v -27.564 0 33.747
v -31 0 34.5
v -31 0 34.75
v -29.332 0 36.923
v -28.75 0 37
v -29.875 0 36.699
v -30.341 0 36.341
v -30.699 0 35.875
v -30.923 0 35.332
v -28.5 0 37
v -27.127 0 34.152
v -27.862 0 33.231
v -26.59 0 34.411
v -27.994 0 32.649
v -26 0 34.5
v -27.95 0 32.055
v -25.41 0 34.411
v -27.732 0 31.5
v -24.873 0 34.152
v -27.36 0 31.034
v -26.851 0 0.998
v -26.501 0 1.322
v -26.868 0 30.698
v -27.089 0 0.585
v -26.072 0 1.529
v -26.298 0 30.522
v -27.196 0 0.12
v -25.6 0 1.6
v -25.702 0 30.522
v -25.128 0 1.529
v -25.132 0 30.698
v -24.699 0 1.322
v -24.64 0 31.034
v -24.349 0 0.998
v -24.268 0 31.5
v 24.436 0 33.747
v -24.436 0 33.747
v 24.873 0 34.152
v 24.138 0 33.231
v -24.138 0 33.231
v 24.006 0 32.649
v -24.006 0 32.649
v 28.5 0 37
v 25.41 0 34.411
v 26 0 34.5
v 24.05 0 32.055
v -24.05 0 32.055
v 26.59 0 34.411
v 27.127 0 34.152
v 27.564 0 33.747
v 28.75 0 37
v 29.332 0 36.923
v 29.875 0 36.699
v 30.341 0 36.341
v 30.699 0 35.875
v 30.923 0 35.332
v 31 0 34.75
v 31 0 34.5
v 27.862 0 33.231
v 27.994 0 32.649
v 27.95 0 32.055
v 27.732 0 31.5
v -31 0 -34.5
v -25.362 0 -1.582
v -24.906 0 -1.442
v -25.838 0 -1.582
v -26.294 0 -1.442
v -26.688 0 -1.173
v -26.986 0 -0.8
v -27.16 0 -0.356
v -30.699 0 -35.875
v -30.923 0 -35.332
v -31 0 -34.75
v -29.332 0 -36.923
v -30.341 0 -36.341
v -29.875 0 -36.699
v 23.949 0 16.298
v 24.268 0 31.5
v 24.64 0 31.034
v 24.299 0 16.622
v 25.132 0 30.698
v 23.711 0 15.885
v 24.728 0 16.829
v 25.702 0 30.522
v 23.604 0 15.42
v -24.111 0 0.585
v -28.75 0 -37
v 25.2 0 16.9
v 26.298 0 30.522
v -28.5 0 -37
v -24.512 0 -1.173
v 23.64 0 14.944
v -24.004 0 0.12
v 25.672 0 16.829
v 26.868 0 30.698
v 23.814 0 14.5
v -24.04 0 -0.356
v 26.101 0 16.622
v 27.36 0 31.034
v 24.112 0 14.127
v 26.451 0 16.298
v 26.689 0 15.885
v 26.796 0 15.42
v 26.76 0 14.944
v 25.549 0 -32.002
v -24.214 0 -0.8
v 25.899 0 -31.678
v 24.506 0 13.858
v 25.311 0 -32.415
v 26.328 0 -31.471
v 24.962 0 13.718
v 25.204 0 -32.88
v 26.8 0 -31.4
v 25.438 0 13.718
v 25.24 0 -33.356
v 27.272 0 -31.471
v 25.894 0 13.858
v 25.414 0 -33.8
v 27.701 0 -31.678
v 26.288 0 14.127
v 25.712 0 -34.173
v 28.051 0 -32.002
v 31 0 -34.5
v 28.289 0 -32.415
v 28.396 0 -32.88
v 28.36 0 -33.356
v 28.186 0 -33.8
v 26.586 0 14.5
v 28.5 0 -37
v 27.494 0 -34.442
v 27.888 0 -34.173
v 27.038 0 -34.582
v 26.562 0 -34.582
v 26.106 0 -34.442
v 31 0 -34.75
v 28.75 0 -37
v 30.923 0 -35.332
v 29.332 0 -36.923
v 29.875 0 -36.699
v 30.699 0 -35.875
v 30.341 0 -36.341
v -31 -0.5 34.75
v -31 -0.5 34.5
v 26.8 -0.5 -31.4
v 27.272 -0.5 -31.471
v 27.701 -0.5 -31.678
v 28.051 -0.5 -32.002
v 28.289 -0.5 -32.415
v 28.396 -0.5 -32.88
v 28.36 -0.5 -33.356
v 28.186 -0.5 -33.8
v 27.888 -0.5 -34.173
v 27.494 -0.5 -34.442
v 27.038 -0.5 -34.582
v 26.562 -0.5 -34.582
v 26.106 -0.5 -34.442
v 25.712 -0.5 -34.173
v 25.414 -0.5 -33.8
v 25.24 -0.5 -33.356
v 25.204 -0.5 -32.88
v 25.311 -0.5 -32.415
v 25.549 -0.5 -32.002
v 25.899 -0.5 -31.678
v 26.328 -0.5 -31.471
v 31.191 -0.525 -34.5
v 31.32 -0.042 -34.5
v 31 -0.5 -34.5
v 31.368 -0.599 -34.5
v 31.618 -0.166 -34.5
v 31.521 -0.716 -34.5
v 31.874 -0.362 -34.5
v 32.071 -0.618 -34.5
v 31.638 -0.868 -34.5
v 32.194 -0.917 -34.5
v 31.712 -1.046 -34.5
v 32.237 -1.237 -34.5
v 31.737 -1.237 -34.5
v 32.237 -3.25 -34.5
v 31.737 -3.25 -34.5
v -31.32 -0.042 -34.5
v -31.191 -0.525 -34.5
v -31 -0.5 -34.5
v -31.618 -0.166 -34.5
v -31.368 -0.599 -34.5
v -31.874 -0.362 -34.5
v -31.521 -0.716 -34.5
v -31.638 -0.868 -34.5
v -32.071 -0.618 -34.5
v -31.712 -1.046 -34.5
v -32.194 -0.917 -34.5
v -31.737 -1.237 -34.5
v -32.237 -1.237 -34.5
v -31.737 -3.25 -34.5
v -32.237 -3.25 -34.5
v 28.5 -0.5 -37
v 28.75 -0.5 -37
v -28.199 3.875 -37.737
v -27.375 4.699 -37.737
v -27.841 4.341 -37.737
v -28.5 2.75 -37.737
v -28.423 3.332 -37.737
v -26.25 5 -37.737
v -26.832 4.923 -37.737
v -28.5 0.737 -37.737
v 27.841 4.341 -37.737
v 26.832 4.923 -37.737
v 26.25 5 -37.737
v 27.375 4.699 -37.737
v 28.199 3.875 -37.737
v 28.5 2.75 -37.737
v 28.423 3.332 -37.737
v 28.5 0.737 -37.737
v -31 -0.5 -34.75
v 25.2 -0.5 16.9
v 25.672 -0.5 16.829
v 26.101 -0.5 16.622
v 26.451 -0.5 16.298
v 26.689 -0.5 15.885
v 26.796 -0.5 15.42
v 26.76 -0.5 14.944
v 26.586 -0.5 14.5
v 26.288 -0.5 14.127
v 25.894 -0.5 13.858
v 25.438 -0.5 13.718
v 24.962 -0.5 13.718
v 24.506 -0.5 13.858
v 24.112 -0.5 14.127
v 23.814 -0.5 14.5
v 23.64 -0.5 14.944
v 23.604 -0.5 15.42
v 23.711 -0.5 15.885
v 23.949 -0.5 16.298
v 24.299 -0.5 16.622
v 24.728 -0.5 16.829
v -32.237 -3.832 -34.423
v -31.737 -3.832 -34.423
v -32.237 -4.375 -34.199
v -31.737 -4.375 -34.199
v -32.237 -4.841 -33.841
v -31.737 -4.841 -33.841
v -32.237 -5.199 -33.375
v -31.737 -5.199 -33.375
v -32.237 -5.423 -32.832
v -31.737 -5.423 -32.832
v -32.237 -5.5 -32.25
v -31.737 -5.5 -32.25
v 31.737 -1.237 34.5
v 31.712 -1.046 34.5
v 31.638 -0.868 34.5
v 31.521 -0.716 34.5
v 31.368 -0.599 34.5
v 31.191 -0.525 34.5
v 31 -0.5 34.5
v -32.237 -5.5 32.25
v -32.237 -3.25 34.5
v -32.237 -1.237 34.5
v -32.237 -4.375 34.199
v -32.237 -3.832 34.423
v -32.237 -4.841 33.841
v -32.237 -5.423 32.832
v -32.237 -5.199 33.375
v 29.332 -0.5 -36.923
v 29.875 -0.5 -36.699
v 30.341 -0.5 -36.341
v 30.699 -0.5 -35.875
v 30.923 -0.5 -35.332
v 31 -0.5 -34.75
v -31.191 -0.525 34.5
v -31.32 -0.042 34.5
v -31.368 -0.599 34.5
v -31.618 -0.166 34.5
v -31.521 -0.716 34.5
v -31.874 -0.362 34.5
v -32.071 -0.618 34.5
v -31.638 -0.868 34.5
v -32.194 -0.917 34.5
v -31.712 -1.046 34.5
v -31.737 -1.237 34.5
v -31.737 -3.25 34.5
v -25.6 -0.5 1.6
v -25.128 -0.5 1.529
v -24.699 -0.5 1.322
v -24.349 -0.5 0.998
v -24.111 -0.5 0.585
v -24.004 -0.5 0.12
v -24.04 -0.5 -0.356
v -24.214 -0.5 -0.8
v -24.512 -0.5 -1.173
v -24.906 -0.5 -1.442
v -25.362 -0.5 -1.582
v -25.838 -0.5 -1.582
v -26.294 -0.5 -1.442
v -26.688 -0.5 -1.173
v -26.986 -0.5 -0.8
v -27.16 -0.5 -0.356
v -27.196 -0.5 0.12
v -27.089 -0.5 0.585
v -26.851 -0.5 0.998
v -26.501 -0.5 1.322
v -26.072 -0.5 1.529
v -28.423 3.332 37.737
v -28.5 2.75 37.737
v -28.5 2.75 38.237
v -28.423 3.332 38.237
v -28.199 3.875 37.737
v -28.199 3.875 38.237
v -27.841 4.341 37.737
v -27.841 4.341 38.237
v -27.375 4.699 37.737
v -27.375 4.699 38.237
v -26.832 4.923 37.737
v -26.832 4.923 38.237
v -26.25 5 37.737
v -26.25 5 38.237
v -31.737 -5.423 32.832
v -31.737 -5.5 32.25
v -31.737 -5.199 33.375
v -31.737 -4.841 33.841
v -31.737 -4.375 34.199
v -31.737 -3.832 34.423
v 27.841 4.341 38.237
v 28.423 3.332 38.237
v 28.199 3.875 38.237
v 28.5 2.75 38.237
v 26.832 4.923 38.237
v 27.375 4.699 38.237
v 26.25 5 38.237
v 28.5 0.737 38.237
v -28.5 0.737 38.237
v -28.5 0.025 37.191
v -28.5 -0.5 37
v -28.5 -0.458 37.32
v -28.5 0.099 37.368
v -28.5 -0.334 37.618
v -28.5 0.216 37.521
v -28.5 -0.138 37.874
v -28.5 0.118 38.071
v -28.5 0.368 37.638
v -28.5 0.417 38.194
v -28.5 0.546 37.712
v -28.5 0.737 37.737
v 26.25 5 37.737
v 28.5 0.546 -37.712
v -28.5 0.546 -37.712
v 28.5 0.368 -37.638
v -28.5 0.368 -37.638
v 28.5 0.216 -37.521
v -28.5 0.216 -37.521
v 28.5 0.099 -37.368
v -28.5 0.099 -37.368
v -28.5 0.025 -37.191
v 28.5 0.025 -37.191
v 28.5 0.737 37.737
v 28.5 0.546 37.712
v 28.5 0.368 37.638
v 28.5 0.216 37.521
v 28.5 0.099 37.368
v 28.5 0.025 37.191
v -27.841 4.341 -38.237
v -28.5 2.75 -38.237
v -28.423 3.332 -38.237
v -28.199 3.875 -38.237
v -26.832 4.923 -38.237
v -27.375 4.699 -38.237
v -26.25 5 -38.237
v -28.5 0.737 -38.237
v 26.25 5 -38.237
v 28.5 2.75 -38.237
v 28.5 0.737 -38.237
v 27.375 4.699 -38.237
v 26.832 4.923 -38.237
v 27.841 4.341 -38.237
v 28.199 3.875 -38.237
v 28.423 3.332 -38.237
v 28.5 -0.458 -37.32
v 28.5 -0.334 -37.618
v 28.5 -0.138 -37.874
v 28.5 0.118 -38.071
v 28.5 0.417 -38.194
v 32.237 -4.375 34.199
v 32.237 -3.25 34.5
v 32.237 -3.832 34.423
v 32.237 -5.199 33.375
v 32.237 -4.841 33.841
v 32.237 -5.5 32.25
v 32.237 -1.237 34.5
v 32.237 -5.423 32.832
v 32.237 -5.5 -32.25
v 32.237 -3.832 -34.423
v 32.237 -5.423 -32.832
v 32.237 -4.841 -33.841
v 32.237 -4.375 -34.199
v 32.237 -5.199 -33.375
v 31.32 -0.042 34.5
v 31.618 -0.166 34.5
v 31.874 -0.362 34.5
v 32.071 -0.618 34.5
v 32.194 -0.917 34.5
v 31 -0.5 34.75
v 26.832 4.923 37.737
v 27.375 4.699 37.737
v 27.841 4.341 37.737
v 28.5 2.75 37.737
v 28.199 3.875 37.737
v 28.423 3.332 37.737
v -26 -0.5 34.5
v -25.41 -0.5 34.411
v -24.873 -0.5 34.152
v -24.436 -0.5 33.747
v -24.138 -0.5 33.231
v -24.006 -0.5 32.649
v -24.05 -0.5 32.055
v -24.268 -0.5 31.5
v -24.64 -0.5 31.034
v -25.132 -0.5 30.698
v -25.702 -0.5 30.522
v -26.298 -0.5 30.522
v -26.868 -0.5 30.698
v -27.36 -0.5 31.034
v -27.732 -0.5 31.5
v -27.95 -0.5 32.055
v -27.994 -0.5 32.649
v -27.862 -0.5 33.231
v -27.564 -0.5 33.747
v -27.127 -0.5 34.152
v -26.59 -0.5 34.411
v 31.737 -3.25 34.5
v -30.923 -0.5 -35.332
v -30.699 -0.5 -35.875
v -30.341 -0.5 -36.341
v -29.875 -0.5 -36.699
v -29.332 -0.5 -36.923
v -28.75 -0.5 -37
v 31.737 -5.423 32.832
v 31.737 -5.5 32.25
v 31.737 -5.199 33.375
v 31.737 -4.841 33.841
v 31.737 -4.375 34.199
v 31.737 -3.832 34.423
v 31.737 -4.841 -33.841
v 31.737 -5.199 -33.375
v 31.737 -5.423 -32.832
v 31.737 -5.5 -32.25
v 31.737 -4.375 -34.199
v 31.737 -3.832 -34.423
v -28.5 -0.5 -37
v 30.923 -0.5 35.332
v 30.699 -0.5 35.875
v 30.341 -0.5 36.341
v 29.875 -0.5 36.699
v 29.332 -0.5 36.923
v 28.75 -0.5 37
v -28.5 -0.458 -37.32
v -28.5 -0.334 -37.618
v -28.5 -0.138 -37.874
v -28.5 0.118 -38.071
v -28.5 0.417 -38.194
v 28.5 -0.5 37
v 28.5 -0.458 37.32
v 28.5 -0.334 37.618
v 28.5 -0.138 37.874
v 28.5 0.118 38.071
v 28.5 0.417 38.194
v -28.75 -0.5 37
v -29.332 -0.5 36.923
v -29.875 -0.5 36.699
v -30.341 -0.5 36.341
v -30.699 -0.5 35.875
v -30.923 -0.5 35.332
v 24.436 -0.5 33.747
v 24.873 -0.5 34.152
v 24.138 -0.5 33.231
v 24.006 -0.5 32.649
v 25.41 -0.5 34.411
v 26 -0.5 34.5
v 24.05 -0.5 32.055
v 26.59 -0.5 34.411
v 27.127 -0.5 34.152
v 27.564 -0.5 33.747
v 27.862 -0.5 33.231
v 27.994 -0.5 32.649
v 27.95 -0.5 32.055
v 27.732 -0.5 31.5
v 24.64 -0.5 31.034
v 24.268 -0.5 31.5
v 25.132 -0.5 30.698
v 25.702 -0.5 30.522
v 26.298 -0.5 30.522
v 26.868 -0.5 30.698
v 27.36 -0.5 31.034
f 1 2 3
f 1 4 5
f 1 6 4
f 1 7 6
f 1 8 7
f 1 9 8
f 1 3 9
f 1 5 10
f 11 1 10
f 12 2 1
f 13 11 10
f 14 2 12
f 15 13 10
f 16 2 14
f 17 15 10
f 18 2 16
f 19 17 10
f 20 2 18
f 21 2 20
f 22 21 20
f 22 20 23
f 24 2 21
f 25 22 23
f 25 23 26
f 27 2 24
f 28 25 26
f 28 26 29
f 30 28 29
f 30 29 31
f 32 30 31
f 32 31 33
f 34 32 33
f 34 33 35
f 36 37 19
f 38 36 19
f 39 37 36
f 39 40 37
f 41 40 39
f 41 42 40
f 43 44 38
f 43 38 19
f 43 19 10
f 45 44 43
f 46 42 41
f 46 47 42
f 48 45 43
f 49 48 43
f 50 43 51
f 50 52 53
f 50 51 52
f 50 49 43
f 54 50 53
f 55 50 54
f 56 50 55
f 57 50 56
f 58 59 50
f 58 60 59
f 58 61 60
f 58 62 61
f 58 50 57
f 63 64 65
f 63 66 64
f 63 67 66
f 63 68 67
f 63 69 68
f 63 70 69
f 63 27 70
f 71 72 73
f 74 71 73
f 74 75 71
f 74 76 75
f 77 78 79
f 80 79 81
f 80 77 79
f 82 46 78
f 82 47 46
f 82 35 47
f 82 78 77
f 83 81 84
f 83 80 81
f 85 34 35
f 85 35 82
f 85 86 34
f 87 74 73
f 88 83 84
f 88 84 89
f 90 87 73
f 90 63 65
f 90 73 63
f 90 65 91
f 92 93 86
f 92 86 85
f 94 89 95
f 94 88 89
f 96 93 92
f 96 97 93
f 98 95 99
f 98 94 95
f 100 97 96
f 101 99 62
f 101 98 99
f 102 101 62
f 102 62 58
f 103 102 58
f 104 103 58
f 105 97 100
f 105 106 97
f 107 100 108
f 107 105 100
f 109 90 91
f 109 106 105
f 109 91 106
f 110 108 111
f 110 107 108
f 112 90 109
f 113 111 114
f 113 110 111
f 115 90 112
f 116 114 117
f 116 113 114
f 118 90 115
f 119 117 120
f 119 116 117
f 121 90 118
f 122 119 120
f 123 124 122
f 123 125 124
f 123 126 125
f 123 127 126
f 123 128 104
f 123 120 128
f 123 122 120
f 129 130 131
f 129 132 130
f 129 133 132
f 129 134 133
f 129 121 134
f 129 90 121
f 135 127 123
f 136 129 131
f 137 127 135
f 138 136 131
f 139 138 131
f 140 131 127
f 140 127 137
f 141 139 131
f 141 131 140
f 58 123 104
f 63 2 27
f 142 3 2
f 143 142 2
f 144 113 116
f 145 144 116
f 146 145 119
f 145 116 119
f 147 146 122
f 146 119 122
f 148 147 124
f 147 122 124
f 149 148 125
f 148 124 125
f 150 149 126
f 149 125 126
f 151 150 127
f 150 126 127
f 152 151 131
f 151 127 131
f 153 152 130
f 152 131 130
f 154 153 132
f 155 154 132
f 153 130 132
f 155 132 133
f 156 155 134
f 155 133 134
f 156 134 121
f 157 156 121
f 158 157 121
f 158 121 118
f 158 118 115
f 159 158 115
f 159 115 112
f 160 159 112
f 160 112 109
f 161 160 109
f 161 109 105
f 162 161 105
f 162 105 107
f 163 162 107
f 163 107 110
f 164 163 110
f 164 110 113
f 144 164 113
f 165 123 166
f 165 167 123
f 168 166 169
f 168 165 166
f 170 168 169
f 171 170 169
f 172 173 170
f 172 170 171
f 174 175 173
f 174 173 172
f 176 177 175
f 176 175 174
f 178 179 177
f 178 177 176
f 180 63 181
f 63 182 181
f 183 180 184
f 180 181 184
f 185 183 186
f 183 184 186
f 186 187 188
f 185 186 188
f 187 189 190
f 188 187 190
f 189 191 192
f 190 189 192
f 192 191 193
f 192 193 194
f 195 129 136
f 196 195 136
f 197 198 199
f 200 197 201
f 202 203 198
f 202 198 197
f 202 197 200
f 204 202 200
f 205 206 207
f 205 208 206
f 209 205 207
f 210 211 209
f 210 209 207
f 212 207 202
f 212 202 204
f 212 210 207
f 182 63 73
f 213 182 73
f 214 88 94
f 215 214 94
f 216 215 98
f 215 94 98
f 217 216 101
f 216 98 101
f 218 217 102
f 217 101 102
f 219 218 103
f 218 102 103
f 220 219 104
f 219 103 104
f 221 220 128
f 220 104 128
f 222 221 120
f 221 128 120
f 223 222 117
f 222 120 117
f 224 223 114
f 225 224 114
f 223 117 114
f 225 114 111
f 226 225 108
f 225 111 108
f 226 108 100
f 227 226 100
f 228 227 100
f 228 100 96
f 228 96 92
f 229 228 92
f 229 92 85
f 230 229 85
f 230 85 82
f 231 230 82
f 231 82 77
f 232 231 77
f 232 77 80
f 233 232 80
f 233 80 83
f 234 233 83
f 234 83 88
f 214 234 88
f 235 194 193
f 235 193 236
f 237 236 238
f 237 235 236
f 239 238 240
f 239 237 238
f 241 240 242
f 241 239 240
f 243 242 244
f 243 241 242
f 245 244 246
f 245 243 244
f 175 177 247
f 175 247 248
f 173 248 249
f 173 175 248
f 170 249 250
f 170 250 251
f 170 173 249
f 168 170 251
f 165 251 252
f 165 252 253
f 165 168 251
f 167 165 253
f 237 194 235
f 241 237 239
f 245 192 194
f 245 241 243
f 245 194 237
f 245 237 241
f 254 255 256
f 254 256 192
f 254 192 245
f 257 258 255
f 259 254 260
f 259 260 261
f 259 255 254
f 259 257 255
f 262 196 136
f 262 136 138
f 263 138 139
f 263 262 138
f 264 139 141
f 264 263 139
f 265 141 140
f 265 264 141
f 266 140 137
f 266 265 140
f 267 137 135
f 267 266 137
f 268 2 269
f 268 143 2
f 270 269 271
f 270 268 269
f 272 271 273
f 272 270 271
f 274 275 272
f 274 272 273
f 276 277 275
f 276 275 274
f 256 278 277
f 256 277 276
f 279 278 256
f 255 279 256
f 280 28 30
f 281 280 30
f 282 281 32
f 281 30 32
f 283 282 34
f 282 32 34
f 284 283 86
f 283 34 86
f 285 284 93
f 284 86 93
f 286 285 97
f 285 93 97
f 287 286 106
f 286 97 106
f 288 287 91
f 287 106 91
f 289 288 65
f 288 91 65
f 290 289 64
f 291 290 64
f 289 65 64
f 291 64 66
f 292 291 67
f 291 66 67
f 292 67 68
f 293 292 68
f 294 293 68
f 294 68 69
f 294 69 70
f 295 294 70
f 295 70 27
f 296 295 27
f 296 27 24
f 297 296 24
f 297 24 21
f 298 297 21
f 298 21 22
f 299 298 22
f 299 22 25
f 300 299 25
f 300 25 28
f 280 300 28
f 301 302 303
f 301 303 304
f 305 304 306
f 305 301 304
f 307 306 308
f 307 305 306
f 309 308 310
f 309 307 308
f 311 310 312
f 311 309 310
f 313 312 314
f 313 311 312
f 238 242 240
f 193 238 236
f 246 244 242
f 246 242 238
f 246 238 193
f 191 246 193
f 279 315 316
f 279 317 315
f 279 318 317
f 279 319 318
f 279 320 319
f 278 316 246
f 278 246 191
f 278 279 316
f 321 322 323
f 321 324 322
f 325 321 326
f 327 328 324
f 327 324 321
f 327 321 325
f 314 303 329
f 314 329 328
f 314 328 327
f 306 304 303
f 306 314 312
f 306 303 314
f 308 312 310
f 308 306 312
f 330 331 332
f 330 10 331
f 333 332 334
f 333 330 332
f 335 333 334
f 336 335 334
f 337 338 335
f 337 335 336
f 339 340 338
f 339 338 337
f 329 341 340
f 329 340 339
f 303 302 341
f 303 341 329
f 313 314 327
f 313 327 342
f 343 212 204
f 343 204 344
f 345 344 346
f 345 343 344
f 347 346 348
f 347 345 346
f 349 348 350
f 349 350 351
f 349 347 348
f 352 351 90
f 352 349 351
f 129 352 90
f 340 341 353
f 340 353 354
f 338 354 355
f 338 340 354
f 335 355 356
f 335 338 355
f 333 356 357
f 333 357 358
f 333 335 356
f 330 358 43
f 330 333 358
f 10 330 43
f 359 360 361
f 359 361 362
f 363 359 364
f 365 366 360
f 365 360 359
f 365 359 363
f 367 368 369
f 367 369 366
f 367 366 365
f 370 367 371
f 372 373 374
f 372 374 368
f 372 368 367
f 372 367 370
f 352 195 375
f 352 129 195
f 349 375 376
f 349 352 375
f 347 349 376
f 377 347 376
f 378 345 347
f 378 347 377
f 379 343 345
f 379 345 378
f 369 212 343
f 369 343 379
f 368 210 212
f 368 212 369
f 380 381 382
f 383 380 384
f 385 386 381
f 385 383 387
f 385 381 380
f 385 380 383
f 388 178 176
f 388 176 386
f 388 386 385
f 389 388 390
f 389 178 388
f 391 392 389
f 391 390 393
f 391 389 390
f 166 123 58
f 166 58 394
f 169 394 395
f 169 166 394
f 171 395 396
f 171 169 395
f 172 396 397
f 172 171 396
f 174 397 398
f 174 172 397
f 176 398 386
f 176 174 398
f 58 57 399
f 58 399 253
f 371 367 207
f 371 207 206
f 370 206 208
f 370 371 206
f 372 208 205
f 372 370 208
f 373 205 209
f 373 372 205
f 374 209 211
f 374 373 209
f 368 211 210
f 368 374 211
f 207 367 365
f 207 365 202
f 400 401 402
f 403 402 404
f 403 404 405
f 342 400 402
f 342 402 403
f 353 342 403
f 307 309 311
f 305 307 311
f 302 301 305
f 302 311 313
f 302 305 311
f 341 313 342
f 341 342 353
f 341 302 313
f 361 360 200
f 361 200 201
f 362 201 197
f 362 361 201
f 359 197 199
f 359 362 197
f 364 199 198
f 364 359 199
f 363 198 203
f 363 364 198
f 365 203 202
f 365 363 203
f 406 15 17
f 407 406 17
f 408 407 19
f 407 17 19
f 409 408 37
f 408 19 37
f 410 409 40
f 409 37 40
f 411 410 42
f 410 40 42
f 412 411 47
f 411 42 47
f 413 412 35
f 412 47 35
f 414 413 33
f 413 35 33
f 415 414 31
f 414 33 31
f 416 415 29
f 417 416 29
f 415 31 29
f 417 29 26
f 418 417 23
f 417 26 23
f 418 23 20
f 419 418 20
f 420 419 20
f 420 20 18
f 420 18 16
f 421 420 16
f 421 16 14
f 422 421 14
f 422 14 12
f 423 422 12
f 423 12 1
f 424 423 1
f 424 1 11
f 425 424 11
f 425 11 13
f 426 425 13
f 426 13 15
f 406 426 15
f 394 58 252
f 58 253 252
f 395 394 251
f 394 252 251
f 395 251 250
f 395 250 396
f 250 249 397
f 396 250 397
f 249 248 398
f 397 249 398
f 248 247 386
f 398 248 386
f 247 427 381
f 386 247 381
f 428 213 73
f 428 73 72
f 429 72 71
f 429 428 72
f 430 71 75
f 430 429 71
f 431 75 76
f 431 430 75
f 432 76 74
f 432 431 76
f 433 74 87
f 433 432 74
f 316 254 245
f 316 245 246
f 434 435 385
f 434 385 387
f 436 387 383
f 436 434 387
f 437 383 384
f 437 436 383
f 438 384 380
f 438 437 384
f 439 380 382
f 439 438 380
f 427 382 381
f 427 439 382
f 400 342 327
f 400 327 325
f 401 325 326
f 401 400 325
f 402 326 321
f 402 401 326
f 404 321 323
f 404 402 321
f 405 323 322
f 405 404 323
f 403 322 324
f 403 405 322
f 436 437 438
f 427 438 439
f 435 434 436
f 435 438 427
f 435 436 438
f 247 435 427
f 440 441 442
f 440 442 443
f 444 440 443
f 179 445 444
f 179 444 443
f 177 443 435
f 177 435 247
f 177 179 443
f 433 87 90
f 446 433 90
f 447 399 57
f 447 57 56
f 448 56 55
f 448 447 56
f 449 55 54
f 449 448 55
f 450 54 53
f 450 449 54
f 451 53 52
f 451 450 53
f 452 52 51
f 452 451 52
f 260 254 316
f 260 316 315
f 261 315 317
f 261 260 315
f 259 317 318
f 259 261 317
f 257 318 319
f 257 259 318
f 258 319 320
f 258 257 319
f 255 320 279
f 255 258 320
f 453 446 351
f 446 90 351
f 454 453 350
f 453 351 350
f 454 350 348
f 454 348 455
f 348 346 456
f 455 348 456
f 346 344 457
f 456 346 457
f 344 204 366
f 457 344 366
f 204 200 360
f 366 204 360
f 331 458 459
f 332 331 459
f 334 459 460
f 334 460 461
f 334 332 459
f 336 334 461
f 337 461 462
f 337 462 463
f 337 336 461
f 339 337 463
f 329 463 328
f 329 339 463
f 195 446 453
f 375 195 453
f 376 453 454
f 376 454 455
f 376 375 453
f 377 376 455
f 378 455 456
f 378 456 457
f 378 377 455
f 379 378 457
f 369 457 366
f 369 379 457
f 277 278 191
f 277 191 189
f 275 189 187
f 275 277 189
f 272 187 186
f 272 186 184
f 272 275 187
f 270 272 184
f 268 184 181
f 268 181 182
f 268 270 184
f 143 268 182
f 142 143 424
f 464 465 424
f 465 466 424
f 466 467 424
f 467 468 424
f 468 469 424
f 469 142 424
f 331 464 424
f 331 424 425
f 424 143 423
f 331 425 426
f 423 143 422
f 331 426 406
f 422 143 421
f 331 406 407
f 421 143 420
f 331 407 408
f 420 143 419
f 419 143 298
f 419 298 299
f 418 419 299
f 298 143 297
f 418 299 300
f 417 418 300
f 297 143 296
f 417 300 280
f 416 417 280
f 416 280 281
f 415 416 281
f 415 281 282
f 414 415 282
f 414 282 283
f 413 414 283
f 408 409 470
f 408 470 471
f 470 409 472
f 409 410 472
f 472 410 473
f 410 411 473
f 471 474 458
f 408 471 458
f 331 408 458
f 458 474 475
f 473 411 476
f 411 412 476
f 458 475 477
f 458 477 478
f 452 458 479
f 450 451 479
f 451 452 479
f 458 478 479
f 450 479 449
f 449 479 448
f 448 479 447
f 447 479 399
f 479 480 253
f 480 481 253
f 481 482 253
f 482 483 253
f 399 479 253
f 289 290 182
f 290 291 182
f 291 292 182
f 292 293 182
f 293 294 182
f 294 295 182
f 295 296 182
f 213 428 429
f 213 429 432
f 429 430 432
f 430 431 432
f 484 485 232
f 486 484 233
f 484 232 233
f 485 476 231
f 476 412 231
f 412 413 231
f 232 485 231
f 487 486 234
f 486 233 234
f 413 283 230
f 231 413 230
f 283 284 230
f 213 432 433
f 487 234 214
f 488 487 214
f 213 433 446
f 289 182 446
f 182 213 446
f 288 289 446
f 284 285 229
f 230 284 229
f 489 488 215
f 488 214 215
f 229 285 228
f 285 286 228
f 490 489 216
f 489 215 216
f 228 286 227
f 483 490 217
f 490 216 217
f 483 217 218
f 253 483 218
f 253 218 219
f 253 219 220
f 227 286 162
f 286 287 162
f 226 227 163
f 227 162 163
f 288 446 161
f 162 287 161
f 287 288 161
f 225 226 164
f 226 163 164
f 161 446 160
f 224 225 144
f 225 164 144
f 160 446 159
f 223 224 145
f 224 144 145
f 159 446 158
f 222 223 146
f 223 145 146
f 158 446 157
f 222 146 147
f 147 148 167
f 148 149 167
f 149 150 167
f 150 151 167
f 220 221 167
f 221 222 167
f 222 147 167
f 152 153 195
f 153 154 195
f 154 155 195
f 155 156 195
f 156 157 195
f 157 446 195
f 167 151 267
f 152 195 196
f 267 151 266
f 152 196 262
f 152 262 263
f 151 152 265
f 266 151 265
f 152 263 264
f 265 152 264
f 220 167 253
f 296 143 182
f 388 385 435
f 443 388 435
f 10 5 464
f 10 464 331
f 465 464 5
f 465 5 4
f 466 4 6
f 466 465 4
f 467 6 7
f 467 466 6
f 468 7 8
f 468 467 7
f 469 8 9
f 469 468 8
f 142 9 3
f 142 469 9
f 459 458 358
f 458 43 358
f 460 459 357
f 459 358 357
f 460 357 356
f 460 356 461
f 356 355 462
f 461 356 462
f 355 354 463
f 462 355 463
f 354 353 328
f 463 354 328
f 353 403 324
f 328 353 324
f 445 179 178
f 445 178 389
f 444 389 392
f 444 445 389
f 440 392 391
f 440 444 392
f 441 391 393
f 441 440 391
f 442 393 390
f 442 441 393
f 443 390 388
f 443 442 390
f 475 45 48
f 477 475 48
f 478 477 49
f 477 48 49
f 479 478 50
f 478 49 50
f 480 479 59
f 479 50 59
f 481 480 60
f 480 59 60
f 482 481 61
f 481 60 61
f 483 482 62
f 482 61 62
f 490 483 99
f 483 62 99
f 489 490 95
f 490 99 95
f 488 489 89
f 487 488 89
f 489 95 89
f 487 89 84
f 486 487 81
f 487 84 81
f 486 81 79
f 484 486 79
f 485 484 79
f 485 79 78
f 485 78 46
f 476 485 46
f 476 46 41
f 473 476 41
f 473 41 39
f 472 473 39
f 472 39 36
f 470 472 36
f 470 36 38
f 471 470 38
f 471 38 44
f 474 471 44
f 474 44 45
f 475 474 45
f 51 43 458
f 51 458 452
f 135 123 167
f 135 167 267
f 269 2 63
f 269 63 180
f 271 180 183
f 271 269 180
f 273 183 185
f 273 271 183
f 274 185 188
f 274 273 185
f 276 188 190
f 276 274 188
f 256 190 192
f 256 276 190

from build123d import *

# Parameters (mm, degrees)
SKETCH2_W               = 62
SKETCH2_H               = 74
BASE_FLANGE1_DEPTH      = 0.5
CUT_EXTRUDE1_REACH      = 50.273
SKETCH5_R               = 2
SKETCH5_R_2             = 1.6
EDGE_FLANGE1_DEPTH      = 57
EDGE_FLANGE1_BEND_DEPTH = 57
EDGE_FLANGE2_DEPTH      = 69
EDGE_FLANGE2_BEND_DEPTH = 69
BREAK_CORNER1_START     = -32.2366
BREAK_CORNER1_DEPTH     = 64.4732
BREAK_CORNER1_START_2   = -38.2366
BREAK_CORNER1_2_DEPTH   = 76.4732
BREAK_CORNER1_START_3   = -0.5
BREAK_CORNER1_3_DEPTH   = 0.5


# Read off the part's stored shape, not the designer's step: Break-Corner1
# Sheet-metal steps are written as plain solids
with BuildPart() as part:
    # Sketch2 → Base-Flange1 (new body)
    with BuildSketch(Plane(origin=(0, 0, 0), x_dir=(1, 0, 0), z_dir=(0, 1, 0))):
        Rectangle(SKETCH2_W, SKETCH2_H)
    extrude(amount=-BASE_FLANGE1_DEPTH)

    # Sketch5 → Cut-Extrude1 (cut, up to next)
    with BuildSketch(Plane(origin=(0, 0, 0), x_dir=(1, 0, 0), z_dir=(0, 1, 0)), mode=Mode.PRIVATE) as cut_extrude1_sk1:
        with Locations(Location((-26, -32.5, 0), (0, 0, 270))):
            Circle(SKETCH5_R)
    cut_extrude1_tool1 = extrude(cut_extrude1_sk1.sketch, amount=-CUT_EXTRUDE1_REACH, mode=Mode.PRIVATE) & part.part
    # Sketch5 → Cut-Extrude1 (cut, up to next)
    with BuildSketch(Plane(origin=(0, 0, 0), x_dir=(1, 0, 0), z_dir=(0, 1, 0)), mode=Mode.PRIVATE) as cut_extrude1_sk2:
        with Locations(Location((25.2, -15.3, 0), (0, 0, 270))):
            Circle(SKETCH5_R_2)
    cut_extrude1_tool2 = extrude(cut_extrude1_sk2.sketch, amount=-CUT_EXTRUDE1_REACH, mode=Mode.PRIVATE) & part.part
    # Sketch5 → Cut-Extrude1 (cut, up to next)
    with BuildSketch(Plane(origin=(0, 0, 0), x_dir=(1, 0, 0), z_dir=(0, 1, 0)), mode=Mode.PRIVATE) as cut_extrude1_sk3:
        with Locations(Location((-25.6, 0, 0), (0, 0, 270))):
            Circle(SKETCH5_R_2)
    cut_extrude1_tool3 = extrude(cut_extrude1_sk3.sketch, amount=-CUT_EXTRUDE1_REACH, mode=Mode.PRIVATE) & part.part
    # Sketch5 → Cut-Extrude1 (cut, up to next)
    with BuildSketch(Plane(origin=(0, 0, 0), x_dir=(1, 0, 0), z_dir=(0, 1, 0)), mode=Mode.PRIVATE) as cut_extrude1_sk4:
        with Locations(Location((26.8, 33, 0), (0, 0, 270))):
            Circle(SKETCH5_R_2)
    cut_extrude1_tool4 = extrude(cut_extrude1_sk4.sketch, amount=-CUT_EXTRUDE1_REACH, mode=Mode.PRIVATE) & part.part
    # Sketch5 → Cut-Extrude1 (cut, up to next)
    with BuildSketch(Plane(origin=(0, 0, 0), x_dir=(1, 0, 0), z_dir=(0, 1, 0)), mode=Mode.PRIVATE) as cut_extrude1_sk5:
        with Locations(Location((26, -32.5, 0), (0, 0, 270))):
            Circle(SKETCH5_R)
    cut_extrude1_tool5 = extrude(cut_extrude1_sk5.sketch, amount=-CUT_EXTRUDE1_REACH, mode=Mode.PRIVATE) & part.part
    add(cut_extrude1_tool1.solids().sort_by_distance((-26, 0, 32.5))[0], mode=Mode.SUBTRACT)
    add(cut_extrude1_tool2.solids().sort_by_distance((25.2, 0, 15.3))[0], mode=Mode.SUBTRACT)
    add(cut_extrude1_tool3.solids().sort_by_distance((-25.6, 0, 0))[0], mode=Mode.SUBTRACT)
    add(cut_extrude1_tool4.solids().sort_by_distance((26.8, 0, -33))[0], mode=Mode.SUBTRACT)
    add(cut_extrude1_tool5.solids().sort_by_distance((26, 0, 32.5))[0], mode=Mode.SUBTRACT)

    # Edge-Flange1 section (across the edge) → Edge-Flange1 (add)
    with BuildSketch(Plane(origin=(28.5, 0, -37.7366), x_dir=(0, 0, 1), z_dir=(-1, 0, 0))):
        with BuildLine():
            Line((-0.5, 0.7366), (-0.5, 5))
            Line((-0.5, 5), (0, 5))
            Line((0, 5), (0, 0.7366))
            ThreePointArc((0, 0.7366), (0.215745145, 0.215745145), (0.7366, 0))
            Line((0.7366, 0), (0.7366, -0.5))
            ThreePointArc((0.7366, -0.5), (-0.137808246, -0.137808246), (-0.5, 0.7366))
        make_face()
    extrude(amount=EDGE_FLANGE1_DEPTH)

    # Edge-Flange1 section 2 (across the edge) → Edge-Flange1 bend (add)
    with BuildSketch(Plane(origin=(-28.5, 0, 37.7366), x_dir=(0, 0, -1), z_dir=(1, 0, 0))):
        with BuildLine():
            Line((-0.5, 0.7366), (-0.5, 5))
            Line((-0.5, 5), (0, 5))
            Line((0, 5), (0, 0.7366))
            ThreePointArc((0, 0.7366), (0.215745145, 0.215745145), (0.7366, 0))
            Line((0.7366, 0), (0.7366, -0.5))
            ThreePointArc((0.7366, -0.5), (-0.137808246, -0.137808246), (-0.5, 0.7366))
        make_face()
    extrude(amount=EDGE_FLANGE1_BEND_DEPTH)

    # Edge-Flange2 section (across the edge) → Edge-Flange2 (add)
    with BuildSketch(Plane(origin=(31.7366, -0.5, -34.5), x_dir=(-1, 0, 0), z_dir=(0, 0, 1))):
        with BuildLine():
            Line((-0.5, 0.7366), (-0.5, 5))
            Line((-0.5, 5), (0, 5))
            Line((0, 5), (0, 0.7366))
            ThreePointArc((0, 0.7366), (0.215745145, 0.215745145), (0.7366, 0))
            Line((0.7366, 0), (0.7366, -0.5))
            ThreePointArc((0.7366, -0.5), (-0.137808246, -0.137808246), (-0.5, 0.7366))
        make_face()
    extrude(amount=EDGE_FLANGE2_DEPTH)

    # Edge-Flange2 section 2 (across the edge) → Edge-Flange2 bend (add)
    with BuildSketch(Plane(origin=(-31.7366, -0.5, 34.5), x_dir=(1, 0, 0), z_dir=(0, 0, -1))):
        with BuildLine():
            Line((-0.5, 0.7366), (-0.5, 5))
            Line((-0.5, 5), (0, 5))
            Line((0, 5), (0, 0.7366))
            ThreePointArc((0, 0.7366), (0.215745145, 0.215745145), (0.7366, 0))
            Line((0.7366, 0), (0.7366, -0.5))
            ThreePointArc((0.7366, -0.5), (-0.137808246, -0.137808246), (-0.5, 0.7366))
        make_face()
    extrude(amount=EDGE_FLANGE2_BEND_DEPTH)

    # Break-Corner1 outline → Break-Corner1 (cut)
    with BuildSketch(Plane.YZ.offset(BREAK_CORNER1_START)):
        with BuildLine():
            Line((-5.5, 34.5), (-5.5, 32.25))
            ThreePointArc((-5.5, 32.25), (-4.840990258, 33.840990258), (-3.25, 34.5))
            Line((-3.25, 34.5), (-5.5, 34.5))
        make_face()
        with BuildLine():
            ThreePointArc((-3.25, -34.5), (-4.840990258, -33.840990258), (-5.5, -32.25))
            Line((-5.5, -32.25), (-5.5, -34.5))
            Line((-5.5, -34.5), (-3.25, -34.5))
        make_face()
    extrude(amount=BREAK_CORNER1_DEPTH, mode=Mode.SUBTRACT)

    # Break-Corner1 2 outline → Break-Corner1 2 (cut)
    with BuildSketch(Plane.XY.offset(BREAK_CORNER1_START_2)):
        with BuildLine():
            ThreePointArc((-28.5, 2.75), (-27.840990258, 4.340990258), (-26.25, 5))
            Line((-26.25, 5), (-28.5, 5))
            Line((-28.5, 5), (-28.5, 2.75))
        make_face()
        with BuildLine():
            ThreePointArc((26.25, 5), (27.840990258, 4.340990258), (28.5, 2.75))
            Line((28.5, 2.75), (28.5, 5))
            Line((28.5, 5), (26.25, 5))
        make_face()
    extrude(amount=BREAK_CORNER1_2_DEPTH, mode=Mode.SUBTRACT)

    # Break-Corner1 3 outline → Break-Corner1 3 (cut)
    with BuildSketch(Plane(origin=(0, 0, 0), x_dir=(1, 0, 0), z_dir=(0, 1, 0)).offset(BREAK_CORNER1_START_3)):
        with BuildLine():
            ThreePointArc((-28.75, -37), (-30.340990258, -36.340990258), (-31, -34.75))
            Line((-31, -34.75), (-31, -37))
            Line((-31, -37), (-28.75, -37))
        make_face()
        with BuildLine():
            ThreePointArc((-31, 34.75), (-30.340990258, 36.340990258), (-28.75, 37))
            Line((-28.75, 37), (-31, 37))
            Line((-31, 37), (-31, 34.75))
        make_face()
        with BuildLine():
            ThreePointArc((28.75, 37), (30.340990258, 36.340990258), (31, 34.75))
            Line((31, 34.75), (31, 37))
            Line((31, 37), (28.75, 37))
        make_face()
        with BuildLine():
            ThreePointArc((31, -34.75), (30.340990258, -36.340990258), (28.75, -37))
            Line((28.75, -37), (31, -37))
            Line((31, -37), (31, -34.75))
        make_face()
    extrude(amount=BREAK_CORNER1_3_DEPTH, mode=Mode.SUBTRACT)


solid = part.part
